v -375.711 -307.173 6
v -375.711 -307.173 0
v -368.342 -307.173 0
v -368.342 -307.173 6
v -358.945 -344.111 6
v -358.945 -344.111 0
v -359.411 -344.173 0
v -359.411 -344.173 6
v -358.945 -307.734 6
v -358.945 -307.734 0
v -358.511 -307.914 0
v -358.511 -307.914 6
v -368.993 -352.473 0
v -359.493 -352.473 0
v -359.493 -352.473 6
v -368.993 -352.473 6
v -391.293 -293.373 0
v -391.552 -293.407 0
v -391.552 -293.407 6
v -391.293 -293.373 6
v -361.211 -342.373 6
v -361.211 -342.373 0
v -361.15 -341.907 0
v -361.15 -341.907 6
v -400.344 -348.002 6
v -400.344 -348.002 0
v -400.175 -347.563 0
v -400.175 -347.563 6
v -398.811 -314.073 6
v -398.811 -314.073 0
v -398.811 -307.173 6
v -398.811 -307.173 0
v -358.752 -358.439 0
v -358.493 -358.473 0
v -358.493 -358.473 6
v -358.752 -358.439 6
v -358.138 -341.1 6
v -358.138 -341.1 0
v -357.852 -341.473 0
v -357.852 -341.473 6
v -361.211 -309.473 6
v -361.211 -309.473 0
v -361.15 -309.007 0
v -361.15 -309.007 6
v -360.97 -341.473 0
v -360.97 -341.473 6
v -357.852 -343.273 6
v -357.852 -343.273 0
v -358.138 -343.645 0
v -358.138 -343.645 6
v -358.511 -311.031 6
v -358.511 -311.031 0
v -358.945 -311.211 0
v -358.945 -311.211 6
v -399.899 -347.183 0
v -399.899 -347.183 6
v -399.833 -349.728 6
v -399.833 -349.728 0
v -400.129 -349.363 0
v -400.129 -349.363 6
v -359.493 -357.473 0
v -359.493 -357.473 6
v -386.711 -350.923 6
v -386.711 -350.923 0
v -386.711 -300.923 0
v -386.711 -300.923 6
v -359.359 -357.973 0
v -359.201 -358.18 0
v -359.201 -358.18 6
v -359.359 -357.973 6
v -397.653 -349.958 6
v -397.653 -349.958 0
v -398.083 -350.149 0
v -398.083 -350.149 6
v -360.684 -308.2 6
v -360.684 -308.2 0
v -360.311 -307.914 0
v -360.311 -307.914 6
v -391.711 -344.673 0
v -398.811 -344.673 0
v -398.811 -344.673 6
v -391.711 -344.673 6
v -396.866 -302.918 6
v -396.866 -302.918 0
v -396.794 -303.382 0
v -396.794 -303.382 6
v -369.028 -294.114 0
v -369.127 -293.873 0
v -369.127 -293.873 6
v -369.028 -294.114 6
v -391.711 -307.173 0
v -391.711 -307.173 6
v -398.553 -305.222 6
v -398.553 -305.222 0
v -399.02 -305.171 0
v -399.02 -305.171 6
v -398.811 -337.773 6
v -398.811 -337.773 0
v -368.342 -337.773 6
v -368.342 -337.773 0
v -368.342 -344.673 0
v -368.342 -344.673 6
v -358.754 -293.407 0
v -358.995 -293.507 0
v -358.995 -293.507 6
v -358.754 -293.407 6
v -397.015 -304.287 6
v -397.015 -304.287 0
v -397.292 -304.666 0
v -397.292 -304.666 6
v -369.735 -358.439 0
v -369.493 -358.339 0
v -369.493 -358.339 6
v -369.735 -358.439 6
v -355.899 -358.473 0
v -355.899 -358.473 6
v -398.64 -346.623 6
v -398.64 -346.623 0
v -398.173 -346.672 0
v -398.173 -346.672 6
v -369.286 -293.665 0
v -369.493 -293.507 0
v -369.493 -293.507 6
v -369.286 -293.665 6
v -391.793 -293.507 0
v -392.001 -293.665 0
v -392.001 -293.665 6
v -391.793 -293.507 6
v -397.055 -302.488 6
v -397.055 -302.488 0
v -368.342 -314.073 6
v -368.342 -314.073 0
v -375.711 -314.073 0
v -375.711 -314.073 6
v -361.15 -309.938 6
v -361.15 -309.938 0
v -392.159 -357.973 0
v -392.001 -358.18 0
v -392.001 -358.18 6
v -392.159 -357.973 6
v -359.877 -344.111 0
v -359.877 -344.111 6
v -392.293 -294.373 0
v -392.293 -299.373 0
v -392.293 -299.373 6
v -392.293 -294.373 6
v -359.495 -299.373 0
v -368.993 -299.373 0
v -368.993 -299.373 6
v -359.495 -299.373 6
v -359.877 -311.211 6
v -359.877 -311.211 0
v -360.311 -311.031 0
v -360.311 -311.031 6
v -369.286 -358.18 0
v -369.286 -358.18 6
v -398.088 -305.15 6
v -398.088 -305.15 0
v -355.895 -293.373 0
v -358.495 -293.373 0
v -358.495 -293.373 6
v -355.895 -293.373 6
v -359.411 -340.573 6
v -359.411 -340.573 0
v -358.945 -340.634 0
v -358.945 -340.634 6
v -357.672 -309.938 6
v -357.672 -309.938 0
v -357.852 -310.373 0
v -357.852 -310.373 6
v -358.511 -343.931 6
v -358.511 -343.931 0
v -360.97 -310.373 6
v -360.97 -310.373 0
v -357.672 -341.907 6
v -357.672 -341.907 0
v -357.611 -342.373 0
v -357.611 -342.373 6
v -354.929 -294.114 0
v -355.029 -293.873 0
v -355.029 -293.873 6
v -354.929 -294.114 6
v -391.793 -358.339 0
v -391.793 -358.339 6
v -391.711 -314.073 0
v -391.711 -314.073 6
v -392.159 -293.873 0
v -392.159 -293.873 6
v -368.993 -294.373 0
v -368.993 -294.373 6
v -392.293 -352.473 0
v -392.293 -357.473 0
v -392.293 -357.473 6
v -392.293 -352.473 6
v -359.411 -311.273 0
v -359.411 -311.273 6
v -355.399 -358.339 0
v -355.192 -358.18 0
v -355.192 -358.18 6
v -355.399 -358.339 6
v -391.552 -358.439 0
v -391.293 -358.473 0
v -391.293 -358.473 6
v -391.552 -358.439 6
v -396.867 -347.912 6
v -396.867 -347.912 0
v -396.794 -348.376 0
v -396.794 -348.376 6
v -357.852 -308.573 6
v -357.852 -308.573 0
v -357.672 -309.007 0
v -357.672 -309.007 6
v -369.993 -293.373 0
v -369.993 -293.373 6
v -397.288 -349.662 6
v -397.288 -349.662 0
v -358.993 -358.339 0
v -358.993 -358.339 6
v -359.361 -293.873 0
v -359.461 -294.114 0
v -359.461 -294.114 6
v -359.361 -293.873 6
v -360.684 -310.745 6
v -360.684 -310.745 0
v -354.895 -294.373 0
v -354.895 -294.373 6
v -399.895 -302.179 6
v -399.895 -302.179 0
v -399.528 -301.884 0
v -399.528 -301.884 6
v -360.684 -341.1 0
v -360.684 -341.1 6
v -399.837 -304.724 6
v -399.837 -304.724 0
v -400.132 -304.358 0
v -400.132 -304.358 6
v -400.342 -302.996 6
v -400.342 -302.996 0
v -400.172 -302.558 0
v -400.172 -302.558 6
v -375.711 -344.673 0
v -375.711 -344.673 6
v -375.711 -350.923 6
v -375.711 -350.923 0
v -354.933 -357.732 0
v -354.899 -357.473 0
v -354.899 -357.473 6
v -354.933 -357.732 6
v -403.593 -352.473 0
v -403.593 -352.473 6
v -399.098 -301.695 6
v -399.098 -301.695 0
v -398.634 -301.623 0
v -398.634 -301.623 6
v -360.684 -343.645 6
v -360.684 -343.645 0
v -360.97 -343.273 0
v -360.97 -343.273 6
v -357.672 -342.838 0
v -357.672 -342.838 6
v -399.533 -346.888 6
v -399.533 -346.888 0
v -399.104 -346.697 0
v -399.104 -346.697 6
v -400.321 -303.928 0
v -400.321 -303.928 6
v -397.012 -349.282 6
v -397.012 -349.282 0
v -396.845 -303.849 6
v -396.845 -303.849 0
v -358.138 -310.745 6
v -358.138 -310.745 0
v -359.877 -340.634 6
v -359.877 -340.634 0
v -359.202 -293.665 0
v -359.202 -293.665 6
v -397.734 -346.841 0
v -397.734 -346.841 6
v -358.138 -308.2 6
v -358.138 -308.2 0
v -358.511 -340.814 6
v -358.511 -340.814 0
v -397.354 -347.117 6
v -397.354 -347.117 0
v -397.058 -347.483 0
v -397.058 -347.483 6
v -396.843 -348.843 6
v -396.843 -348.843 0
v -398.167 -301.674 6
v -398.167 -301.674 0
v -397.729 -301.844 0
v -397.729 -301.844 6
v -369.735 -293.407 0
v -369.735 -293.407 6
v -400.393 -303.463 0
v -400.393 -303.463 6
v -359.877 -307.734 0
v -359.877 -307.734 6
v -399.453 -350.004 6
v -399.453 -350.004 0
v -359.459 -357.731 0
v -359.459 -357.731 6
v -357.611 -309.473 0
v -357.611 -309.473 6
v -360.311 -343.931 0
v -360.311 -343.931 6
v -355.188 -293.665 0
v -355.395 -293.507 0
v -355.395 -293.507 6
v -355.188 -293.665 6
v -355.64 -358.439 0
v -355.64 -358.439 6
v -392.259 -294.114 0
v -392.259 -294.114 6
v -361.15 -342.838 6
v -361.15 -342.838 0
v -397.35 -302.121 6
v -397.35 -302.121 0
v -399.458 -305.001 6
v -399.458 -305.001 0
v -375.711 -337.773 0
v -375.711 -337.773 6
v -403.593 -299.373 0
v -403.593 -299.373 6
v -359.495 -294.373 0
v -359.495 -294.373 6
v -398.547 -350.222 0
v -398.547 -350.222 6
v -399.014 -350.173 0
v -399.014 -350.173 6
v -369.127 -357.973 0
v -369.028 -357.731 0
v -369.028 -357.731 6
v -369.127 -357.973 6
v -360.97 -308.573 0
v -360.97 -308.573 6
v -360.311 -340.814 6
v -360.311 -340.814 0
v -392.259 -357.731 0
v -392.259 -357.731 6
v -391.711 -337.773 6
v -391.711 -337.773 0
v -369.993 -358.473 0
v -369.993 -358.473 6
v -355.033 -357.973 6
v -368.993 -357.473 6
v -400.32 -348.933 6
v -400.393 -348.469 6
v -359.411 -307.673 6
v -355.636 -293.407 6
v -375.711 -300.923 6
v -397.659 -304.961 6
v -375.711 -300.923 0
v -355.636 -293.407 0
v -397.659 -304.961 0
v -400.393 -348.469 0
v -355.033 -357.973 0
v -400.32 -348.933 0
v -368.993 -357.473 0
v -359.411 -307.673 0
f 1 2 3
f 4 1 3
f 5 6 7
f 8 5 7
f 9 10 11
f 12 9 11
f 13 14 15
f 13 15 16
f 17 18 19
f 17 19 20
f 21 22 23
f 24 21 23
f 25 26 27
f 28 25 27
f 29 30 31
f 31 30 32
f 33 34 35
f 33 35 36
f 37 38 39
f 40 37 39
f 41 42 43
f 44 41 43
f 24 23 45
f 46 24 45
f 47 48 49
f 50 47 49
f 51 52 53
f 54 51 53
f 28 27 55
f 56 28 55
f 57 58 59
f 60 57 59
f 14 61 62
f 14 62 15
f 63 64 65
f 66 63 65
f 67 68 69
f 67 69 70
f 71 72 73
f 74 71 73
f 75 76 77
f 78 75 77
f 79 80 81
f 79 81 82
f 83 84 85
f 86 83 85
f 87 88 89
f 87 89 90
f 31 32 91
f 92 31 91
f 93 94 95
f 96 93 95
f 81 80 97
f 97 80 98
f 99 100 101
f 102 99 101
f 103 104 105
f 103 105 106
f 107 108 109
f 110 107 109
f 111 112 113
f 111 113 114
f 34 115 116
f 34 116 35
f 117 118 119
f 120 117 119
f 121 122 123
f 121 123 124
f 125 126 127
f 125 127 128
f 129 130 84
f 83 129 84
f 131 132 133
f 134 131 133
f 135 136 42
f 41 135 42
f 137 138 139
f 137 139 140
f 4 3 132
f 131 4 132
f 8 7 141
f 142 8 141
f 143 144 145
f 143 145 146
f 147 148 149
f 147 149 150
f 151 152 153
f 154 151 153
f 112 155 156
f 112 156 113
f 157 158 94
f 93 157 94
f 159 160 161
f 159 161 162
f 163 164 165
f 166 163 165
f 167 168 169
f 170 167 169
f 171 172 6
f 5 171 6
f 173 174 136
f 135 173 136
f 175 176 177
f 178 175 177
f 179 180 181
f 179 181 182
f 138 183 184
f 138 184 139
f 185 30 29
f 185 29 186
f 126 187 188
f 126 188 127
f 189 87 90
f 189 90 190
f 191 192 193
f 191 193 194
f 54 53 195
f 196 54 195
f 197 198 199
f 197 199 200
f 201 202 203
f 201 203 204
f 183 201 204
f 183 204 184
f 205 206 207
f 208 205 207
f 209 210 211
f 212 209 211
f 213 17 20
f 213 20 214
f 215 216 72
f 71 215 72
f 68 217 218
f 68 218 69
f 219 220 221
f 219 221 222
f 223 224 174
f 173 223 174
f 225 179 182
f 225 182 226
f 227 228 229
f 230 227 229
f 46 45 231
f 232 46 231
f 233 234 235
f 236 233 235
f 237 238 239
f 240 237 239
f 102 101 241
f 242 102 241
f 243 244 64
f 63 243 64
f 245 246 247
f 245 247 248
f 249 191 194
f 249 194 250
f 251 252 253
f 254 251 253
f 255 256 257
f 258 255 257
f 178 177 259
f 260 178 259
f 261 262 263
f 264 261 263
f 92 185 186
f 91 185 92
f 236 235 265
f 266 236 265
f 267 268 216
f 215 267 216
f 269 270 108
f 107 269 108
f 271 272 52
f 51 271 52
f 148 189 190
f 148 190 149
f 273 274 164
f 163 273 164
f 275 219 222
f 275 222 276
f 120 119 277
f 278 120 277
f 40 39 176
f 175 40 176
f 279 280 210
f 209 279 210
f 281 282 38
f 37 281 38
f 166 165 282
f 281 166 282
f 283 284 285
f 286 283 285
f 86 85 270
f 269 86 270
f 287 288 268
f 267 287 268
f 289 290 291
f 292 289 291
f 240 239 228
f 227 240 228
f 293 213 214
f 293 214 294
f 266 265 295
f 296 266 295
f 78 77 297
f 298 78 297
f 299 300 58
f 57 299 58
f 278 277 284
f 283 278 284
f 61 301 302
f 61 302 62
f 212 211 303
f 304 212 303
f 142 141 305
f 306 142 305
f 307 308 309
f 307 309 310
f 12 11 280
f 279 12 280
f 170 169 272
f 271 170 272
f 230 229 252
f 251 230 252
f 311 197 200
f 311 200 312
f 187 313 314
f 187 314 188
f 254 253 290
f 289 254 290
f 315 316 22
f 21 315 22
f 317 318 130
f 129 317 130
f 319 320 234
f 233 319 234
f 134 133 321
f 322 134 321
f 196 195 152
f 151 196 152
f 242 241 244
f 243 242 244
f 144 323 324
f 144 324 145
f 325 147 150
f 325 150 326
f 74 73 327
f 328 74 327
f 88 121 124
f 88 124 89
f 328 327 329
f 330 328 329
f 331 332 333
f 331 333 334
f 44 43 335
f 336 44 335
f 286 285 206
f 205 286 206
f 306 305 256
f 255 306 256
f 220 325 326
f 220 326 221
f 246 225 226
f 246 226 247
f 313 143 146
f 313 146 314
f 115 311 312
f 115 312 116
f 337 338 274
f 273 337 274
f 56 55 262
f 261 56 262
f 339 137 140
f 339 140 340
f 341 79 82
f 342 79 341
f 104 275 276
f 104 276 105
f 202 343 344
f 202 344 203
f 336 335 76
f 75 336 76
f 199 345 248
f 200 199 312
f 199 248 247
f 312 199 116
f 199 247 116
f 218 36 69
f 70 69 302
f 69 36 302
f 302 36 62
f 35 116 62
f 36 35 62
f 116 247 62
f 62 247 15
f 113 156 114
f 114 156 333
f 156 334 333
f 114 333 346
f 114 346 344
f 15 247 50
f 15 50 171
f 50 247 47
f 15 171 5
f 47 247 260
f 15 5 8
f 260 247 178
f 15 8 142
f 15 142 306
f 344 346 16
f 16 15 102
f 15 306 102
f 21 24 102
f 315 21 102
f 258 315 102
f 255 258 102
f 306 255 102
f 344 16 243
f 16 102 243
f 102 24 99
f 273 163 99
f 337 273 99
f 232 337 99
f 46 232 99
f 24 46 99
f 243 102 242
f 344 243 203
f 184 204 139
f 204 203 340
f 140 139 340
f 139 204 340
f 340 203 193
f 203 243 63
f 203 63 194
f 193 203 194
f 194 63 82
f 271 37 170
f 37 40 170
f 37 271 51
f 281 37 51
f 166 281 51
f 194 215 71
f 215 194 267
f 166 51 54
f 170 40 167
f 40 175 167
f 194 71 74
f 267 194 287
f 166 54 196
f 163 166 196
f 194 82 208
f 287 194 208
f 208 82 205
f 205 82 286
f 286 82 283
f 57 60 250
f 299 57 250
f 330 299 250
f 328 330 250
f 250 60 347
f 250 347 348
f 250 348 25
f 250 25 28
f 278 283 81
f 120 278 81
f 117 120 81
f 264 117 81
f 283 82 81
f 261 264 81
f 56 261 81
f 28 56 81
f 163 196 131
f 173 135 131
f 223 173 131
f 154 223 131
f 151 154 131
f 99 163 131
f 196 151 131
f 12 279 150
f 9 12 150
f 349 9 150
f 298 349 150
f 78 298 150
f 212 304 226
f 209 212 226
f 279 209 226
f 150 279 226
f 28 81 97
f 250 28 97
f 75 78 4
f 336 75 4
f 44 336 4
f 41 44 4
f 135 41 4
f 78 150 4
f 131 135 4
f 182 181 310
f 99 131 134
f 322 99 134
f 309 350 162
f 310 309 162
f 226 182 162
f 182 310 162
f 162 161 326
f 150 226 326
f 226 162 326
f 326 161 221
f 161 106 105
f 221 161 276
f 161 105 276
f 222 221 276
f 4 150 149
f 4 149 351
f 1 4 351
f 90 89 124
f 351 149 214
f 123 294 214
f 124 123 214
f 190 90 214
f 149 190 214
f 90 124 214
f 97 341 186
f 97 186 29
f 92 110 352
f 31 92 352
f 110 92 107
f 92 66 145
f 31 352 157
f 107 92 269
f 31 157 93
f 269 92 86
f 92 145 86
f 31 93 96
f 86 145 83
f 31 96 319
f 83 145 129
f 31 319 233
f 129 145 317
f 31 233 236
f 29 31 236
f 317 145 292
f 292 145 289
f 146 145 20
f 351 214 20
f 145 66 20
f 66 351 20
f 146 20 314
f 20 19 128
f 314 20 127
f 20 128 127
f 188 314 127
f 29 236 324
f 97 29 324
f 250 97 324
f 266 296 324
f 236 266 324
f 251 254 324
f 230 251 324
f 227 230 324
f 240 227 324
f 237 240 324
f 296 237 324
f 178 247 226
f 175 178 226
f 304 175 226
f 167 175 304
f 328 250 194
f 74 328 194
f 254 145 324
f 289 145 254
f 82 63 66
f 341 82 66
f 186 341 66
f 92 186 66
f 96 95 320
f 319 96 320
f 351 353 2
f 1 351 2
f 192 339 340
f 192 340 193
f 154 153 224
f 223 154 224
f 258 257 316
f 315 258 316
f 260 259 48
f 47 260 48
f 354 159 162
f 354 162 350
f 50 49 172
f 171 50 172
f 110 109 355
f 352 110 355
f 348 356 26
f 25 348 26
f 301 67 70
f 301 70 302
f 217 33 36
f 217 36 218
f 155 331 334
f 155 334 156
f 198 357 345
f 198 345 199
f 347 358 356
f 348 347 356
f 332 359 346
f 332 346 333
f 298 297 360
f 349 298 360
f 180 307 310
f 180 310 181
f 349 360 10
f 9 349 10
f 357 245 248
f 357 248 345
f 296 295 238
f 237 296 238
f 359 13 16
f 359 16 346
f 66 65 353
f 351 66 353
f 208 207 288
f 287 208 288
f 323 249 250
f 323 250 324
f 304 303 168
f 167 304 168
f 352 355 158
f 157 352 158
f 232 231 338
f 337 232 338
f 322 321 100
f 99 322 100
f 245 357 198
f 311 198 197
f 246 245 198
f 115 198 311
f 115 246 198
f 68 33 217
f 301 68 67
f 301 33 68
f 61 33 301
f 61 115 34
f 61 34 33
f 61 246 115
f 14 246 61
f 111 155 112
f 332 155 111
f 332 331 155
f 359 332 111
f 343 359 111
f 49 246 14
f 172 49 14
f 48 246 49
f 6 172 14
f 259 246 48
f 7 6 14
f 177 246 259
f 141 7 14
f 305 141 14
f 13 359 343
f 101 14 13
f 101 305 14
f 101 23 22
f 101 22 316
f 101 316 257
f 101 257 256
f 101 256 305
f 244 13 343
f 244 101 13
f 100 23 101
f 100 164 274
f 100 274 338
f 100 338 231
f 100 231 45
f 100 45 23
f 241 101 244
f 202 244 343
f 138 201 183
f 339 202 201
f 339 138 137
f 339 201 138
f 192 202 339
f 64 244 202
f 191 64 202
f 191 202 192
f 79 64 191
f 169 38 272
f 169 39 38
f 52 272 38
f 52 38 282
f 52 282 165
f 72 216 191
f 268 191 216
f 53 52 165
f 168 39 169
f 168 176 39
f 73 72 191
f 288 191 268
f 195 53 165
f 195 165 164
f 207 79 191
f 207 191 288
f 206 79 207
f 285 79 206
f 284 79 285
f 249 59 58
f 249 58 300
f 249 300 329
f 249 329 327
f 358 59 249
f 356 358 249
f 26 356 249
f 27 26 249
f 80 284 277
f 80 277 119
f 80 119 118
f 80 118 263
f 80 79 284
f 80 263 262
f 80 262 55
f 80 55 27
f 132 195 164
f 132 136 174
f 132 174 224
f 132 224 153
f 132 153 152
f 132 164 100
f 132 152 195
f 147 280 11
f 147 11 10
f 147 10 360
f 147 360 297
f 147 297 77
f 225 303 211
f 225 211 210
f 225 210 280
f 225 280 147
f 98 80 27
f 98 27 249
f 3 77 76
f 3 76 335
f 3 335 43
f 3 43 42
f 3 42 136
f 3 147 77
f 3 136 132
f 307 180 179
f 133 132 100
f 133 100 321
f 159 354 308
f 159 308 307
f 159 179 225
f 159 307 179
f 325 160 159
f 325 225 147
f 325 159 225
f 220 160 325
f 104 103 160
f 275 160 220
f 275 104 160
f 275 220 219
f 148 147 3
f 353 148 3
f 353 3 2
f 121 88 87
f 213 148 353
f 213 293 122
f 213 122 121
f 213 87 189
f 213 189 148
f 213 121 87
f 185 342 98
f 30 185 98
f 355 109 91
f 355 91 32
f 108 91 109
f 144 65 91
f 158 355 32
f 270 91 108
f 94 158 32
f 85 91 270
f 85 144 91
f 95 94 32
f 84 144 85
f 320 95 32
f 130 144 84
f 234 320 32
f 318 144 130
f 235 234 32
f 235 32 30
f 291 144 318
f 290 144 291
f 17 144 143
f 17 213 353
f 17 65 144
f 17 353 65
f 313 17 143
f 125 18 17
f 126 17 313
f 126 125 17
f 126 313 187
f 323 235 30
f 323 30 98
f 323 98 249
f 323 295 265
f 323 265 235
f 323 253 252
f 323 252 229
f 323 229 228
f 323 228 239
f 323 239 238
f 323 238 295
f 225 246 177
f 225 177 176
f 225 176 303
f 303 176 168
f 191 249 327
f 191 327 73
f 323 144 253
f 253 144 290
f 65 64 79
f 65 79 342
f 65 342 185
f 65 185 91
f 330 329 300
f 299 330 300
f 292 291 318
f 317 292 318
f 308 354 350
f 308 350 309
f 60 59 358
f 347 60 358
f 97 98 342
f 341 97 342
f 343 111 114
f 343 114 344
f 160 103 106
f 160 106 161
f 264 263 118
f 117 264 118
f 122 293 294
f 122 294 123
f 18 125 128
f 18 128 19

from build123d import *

# Parameters (mm, degrees)
SKETCH1_W           = 7.1
SKETCH1_H           = 6.9
BOSS_EXTRUDE1_DEPTH = 6


with BuildPart() as part:
    # Sketch1 → Boss-Extrude1 (new body)
    with BuildSketch(Plane.XY):
        Polygon((-358.994880286, -293.50655928), (-358.753699331, -293.406658857), (-358.494880286, -293.372584684), (-355.895187501, -293.372584684), (-355.636368456, -293.406658857), (-355.395187501, -293.50655928), (-355.18808072, -293.665477903), (-355.029162097, -293.872584684), (-354.929261675, -294.113765639), (-354.895187501, -294.372584684), (-354.899121361, -357.473371332), (-354.933365099, -357.732036876), (-355.033357982, -357.973038786), (-355.192292447, -358.179969532), (-355.399348154, -358.338741166), (-355.640428649, -358.438544435), (-355.899121051, -358.472584684), (-358.493457382, -358.472584684), (-358.752276427, -358.43851051), (-358.993457382, -358.338610088), (-359.200564163, -358.179691465), (-359.359482786, -357.972584684), (-359.459383208, -357.731403729), (-359.493457382, -357.472584684), (-359.493457382, -352.472584684), (-368.993457382, -352.472584684), (-368.993457382, -357.472584684), (-369.027531556, -357.731403729), (-369.127431978, -357.972584684), (-369.286350601, -358.179691465), (-369.493457382, -358.338610088), (-369.734638337, -358.43851051), (-369.993457382, -358.472584684), (-391.293457382, -358.472584684), (-391.552276427, -358.43851051), (-391.793457382, -358.338610088), (-392.000564163, -358.179691465), (-392.159482786, -357.972584684), (-392.259383208, -357.731403729), (-392.293457382, -357.472584684), (-392.293457382, -352.472584684), (-403.593457382, -352.472584684), (-403.593457382, -299.372584684), (-392.293457382, -299.372584684), (-392.293457382, -294.372584684), (-392.259383208, -294.113765639), (-392.159482786, -293.872584684), (-392.000564163, -293.665477903), (-391.793457382, -293.50655928), (-391.552276427, -293.406658857), (-391.293457382, -293.372584684), (-369.993457382, -293.372584684), (-369.734638337, -293.406658857), (-369.493457382, -293.50655928), (-369.286350601, -293.665477903), (-369.127431978, -293.872584684), (-369.027531556, -294.113765639), (-368.993457382, -294.372584684), (-368.993457382, -299.372584684), (-359.494880286, -299.372584684), (-359.494880286, -294.372584684), (-359.460806112, -294.113765639), (-359.36090569, -293.872584684), (-359.201987067, -293.665477903), align=None)
        Polygon((-357.610920971, -342.372584684), (-357.672254484, -342.838458965), (-357.852075244, -343.272584684), (-358.138128765, -343.64537689), (-358.510920971, -343.931430411), (-358.94504669, -344.111251171), (-359.410920971, -344.172584684), (-359.876795252, -344.111251171), (-360.310920971, -343.931430411), (-360.683713177, -343.64537689), (-360.969766698, -343.272584684), (-361.149587458, -342.838458965), (-361.210920971, -342.372584684), (-361.149587458, -341.906710403), (-360.969766698, -341.472584684), (-360.683713177, -341.099792478), (-360.310920971, -340.813738957), (-359.876795252, -340.633918196), (-359.410920971, -340.572584684), (-358.94504669, -340.633918196), (-358.510920971, -340.813738957), (-358.138128765, -341.099792478), (-357.852075244, -341.472584684), (-357.672254484, -341.906710403), align=None, mode=Mode.SUBTRACT)
        Polygon((-397.058387805, -347.482605219), (-396.867409445, -347.911939484), (-396.7940584, -348.376073376), (-396.843333421, -348.843376937), (-397.011876498, -349.282004201), (-397.288201699, -349.662063445), (-397.653477917, -349.95765426), (-398.082812183, -350.148632621), (-398.546946075, -350.221983666), (-399.014249636, -350.172708645), (-399.4528769, -350.004165568), (-399.832936144, -349.727840367), (-400.128526959, -349.362564149), (-400.319505319, -348.933229883), (-400.392856365, -348.469095991), (-400.343581343, -348.00179243), (-400.175038266, -347.563165166), (-399.898713066, -347.183105922), (-399.533436847, -346.887515107), (-399.104102582, -346.696536747), (-398.63996869, -346.623185701), (-398.172665129, -346.672460723), (-397.734037865, -346.8410038), (-397.35397862, -347.117329), align=None, mode=Mode.SUBTRACT)
        with Locations((-395.260918473, -310.622584684)):
            Rectangle(SKETCH1_W, SKETCH1_H, mode=Mode.SUBTRACT)
        Polygon((-375.710923469, -337.772584684), (-368.342459311, -337.772584684), (-368.342459311, -344.672584684), (-375.710923469, -344.672584684), (-375.710923469, -350.922574533), (-386.710918473, -350.922574533), (-386.710918473, -300.922594835), (-375.710923469, -300.922594835), (-375.710923469, -307.172584684), (-368.342459311, -307.172584684), (-368.342459311, -314.072584684), (-375.710923469, -314.072584684), align=None, mode=Mode.SUBTRACT)
        Polygon((-358.138128765, -310.74537689), (-358.510920971, -311.031430411), (-358.94504669, -311.211251171), (-359.410920971, -311.272584684), (-359.876795252, -311.211251171), (-360.310920971, -311.031430411), (-360.683713177, -310.74537689), (-360.969766698, -310.372584684), (-361.149587458, -309.938458965), (-361.210920971, -309.472584684), (-361.149587458, -309.006710403), (-360.969766698, -308.572584684), (-360.683713177, -308.199792478), (-360.310920971, -307.913738957), (-359.876795252, -307.733918196), (-359.410920971, -307.672584684), (-358.94504669, -307.733918196), (-358.510920971, -307.913738957), (-358.138128765, -308.199792478), (-357.852075244, -308.572584684), (-357.672254484, -309.006710403), (-357.610920971, -309.472584684), (-357.672254484, -309.938458965), (-357.852075244, -310.372584684), align=None, mode=Mode.SUBTRACT)
        Polygon((-400.321176702, -303.927546021), (-400.392999705, -303.463173217), (-400.342186872, -302.99603437), (-400.172201015, -302.557964223), (-399.894626388, -302.178816531), (-399.528379244, -301.884429584), (-399.09841872, -301.694865364), (-398.634045915, -301.623042361), (-398.166907069, -301.673855193), (-397.728836921, -301.843841051), (-397.34968923, -302.121415678), (-397.055302282, -302.487662822), (-396.865738063, -302.917623346), (-396.79391506, -303.381996151), (-396.844727892, -303.849134997), (-397.014713749, -304.287205145), (-397.292288376, -304.666352836), (-397.65853552, -304.960739784), (-398.088496044, -305.150304003), (-398.552868849, -305.222127006), (-399.020007696, -305.171314174), (-399.458077843, -305.001328317), (-399.837225535, -304.72375369), (-400.131612482, -304.357506546), align=None, mode=Mode.SUBTRACT)
        with Locations((-395.260918473, -341.222584684)):
            Rectangle(SKETCH1_W, SKETCH1_H, mode=Mode.SUBTRACT)
    extrude(amount=BOSS_EXTRUDE1_DEPTH)


solid = part.part
